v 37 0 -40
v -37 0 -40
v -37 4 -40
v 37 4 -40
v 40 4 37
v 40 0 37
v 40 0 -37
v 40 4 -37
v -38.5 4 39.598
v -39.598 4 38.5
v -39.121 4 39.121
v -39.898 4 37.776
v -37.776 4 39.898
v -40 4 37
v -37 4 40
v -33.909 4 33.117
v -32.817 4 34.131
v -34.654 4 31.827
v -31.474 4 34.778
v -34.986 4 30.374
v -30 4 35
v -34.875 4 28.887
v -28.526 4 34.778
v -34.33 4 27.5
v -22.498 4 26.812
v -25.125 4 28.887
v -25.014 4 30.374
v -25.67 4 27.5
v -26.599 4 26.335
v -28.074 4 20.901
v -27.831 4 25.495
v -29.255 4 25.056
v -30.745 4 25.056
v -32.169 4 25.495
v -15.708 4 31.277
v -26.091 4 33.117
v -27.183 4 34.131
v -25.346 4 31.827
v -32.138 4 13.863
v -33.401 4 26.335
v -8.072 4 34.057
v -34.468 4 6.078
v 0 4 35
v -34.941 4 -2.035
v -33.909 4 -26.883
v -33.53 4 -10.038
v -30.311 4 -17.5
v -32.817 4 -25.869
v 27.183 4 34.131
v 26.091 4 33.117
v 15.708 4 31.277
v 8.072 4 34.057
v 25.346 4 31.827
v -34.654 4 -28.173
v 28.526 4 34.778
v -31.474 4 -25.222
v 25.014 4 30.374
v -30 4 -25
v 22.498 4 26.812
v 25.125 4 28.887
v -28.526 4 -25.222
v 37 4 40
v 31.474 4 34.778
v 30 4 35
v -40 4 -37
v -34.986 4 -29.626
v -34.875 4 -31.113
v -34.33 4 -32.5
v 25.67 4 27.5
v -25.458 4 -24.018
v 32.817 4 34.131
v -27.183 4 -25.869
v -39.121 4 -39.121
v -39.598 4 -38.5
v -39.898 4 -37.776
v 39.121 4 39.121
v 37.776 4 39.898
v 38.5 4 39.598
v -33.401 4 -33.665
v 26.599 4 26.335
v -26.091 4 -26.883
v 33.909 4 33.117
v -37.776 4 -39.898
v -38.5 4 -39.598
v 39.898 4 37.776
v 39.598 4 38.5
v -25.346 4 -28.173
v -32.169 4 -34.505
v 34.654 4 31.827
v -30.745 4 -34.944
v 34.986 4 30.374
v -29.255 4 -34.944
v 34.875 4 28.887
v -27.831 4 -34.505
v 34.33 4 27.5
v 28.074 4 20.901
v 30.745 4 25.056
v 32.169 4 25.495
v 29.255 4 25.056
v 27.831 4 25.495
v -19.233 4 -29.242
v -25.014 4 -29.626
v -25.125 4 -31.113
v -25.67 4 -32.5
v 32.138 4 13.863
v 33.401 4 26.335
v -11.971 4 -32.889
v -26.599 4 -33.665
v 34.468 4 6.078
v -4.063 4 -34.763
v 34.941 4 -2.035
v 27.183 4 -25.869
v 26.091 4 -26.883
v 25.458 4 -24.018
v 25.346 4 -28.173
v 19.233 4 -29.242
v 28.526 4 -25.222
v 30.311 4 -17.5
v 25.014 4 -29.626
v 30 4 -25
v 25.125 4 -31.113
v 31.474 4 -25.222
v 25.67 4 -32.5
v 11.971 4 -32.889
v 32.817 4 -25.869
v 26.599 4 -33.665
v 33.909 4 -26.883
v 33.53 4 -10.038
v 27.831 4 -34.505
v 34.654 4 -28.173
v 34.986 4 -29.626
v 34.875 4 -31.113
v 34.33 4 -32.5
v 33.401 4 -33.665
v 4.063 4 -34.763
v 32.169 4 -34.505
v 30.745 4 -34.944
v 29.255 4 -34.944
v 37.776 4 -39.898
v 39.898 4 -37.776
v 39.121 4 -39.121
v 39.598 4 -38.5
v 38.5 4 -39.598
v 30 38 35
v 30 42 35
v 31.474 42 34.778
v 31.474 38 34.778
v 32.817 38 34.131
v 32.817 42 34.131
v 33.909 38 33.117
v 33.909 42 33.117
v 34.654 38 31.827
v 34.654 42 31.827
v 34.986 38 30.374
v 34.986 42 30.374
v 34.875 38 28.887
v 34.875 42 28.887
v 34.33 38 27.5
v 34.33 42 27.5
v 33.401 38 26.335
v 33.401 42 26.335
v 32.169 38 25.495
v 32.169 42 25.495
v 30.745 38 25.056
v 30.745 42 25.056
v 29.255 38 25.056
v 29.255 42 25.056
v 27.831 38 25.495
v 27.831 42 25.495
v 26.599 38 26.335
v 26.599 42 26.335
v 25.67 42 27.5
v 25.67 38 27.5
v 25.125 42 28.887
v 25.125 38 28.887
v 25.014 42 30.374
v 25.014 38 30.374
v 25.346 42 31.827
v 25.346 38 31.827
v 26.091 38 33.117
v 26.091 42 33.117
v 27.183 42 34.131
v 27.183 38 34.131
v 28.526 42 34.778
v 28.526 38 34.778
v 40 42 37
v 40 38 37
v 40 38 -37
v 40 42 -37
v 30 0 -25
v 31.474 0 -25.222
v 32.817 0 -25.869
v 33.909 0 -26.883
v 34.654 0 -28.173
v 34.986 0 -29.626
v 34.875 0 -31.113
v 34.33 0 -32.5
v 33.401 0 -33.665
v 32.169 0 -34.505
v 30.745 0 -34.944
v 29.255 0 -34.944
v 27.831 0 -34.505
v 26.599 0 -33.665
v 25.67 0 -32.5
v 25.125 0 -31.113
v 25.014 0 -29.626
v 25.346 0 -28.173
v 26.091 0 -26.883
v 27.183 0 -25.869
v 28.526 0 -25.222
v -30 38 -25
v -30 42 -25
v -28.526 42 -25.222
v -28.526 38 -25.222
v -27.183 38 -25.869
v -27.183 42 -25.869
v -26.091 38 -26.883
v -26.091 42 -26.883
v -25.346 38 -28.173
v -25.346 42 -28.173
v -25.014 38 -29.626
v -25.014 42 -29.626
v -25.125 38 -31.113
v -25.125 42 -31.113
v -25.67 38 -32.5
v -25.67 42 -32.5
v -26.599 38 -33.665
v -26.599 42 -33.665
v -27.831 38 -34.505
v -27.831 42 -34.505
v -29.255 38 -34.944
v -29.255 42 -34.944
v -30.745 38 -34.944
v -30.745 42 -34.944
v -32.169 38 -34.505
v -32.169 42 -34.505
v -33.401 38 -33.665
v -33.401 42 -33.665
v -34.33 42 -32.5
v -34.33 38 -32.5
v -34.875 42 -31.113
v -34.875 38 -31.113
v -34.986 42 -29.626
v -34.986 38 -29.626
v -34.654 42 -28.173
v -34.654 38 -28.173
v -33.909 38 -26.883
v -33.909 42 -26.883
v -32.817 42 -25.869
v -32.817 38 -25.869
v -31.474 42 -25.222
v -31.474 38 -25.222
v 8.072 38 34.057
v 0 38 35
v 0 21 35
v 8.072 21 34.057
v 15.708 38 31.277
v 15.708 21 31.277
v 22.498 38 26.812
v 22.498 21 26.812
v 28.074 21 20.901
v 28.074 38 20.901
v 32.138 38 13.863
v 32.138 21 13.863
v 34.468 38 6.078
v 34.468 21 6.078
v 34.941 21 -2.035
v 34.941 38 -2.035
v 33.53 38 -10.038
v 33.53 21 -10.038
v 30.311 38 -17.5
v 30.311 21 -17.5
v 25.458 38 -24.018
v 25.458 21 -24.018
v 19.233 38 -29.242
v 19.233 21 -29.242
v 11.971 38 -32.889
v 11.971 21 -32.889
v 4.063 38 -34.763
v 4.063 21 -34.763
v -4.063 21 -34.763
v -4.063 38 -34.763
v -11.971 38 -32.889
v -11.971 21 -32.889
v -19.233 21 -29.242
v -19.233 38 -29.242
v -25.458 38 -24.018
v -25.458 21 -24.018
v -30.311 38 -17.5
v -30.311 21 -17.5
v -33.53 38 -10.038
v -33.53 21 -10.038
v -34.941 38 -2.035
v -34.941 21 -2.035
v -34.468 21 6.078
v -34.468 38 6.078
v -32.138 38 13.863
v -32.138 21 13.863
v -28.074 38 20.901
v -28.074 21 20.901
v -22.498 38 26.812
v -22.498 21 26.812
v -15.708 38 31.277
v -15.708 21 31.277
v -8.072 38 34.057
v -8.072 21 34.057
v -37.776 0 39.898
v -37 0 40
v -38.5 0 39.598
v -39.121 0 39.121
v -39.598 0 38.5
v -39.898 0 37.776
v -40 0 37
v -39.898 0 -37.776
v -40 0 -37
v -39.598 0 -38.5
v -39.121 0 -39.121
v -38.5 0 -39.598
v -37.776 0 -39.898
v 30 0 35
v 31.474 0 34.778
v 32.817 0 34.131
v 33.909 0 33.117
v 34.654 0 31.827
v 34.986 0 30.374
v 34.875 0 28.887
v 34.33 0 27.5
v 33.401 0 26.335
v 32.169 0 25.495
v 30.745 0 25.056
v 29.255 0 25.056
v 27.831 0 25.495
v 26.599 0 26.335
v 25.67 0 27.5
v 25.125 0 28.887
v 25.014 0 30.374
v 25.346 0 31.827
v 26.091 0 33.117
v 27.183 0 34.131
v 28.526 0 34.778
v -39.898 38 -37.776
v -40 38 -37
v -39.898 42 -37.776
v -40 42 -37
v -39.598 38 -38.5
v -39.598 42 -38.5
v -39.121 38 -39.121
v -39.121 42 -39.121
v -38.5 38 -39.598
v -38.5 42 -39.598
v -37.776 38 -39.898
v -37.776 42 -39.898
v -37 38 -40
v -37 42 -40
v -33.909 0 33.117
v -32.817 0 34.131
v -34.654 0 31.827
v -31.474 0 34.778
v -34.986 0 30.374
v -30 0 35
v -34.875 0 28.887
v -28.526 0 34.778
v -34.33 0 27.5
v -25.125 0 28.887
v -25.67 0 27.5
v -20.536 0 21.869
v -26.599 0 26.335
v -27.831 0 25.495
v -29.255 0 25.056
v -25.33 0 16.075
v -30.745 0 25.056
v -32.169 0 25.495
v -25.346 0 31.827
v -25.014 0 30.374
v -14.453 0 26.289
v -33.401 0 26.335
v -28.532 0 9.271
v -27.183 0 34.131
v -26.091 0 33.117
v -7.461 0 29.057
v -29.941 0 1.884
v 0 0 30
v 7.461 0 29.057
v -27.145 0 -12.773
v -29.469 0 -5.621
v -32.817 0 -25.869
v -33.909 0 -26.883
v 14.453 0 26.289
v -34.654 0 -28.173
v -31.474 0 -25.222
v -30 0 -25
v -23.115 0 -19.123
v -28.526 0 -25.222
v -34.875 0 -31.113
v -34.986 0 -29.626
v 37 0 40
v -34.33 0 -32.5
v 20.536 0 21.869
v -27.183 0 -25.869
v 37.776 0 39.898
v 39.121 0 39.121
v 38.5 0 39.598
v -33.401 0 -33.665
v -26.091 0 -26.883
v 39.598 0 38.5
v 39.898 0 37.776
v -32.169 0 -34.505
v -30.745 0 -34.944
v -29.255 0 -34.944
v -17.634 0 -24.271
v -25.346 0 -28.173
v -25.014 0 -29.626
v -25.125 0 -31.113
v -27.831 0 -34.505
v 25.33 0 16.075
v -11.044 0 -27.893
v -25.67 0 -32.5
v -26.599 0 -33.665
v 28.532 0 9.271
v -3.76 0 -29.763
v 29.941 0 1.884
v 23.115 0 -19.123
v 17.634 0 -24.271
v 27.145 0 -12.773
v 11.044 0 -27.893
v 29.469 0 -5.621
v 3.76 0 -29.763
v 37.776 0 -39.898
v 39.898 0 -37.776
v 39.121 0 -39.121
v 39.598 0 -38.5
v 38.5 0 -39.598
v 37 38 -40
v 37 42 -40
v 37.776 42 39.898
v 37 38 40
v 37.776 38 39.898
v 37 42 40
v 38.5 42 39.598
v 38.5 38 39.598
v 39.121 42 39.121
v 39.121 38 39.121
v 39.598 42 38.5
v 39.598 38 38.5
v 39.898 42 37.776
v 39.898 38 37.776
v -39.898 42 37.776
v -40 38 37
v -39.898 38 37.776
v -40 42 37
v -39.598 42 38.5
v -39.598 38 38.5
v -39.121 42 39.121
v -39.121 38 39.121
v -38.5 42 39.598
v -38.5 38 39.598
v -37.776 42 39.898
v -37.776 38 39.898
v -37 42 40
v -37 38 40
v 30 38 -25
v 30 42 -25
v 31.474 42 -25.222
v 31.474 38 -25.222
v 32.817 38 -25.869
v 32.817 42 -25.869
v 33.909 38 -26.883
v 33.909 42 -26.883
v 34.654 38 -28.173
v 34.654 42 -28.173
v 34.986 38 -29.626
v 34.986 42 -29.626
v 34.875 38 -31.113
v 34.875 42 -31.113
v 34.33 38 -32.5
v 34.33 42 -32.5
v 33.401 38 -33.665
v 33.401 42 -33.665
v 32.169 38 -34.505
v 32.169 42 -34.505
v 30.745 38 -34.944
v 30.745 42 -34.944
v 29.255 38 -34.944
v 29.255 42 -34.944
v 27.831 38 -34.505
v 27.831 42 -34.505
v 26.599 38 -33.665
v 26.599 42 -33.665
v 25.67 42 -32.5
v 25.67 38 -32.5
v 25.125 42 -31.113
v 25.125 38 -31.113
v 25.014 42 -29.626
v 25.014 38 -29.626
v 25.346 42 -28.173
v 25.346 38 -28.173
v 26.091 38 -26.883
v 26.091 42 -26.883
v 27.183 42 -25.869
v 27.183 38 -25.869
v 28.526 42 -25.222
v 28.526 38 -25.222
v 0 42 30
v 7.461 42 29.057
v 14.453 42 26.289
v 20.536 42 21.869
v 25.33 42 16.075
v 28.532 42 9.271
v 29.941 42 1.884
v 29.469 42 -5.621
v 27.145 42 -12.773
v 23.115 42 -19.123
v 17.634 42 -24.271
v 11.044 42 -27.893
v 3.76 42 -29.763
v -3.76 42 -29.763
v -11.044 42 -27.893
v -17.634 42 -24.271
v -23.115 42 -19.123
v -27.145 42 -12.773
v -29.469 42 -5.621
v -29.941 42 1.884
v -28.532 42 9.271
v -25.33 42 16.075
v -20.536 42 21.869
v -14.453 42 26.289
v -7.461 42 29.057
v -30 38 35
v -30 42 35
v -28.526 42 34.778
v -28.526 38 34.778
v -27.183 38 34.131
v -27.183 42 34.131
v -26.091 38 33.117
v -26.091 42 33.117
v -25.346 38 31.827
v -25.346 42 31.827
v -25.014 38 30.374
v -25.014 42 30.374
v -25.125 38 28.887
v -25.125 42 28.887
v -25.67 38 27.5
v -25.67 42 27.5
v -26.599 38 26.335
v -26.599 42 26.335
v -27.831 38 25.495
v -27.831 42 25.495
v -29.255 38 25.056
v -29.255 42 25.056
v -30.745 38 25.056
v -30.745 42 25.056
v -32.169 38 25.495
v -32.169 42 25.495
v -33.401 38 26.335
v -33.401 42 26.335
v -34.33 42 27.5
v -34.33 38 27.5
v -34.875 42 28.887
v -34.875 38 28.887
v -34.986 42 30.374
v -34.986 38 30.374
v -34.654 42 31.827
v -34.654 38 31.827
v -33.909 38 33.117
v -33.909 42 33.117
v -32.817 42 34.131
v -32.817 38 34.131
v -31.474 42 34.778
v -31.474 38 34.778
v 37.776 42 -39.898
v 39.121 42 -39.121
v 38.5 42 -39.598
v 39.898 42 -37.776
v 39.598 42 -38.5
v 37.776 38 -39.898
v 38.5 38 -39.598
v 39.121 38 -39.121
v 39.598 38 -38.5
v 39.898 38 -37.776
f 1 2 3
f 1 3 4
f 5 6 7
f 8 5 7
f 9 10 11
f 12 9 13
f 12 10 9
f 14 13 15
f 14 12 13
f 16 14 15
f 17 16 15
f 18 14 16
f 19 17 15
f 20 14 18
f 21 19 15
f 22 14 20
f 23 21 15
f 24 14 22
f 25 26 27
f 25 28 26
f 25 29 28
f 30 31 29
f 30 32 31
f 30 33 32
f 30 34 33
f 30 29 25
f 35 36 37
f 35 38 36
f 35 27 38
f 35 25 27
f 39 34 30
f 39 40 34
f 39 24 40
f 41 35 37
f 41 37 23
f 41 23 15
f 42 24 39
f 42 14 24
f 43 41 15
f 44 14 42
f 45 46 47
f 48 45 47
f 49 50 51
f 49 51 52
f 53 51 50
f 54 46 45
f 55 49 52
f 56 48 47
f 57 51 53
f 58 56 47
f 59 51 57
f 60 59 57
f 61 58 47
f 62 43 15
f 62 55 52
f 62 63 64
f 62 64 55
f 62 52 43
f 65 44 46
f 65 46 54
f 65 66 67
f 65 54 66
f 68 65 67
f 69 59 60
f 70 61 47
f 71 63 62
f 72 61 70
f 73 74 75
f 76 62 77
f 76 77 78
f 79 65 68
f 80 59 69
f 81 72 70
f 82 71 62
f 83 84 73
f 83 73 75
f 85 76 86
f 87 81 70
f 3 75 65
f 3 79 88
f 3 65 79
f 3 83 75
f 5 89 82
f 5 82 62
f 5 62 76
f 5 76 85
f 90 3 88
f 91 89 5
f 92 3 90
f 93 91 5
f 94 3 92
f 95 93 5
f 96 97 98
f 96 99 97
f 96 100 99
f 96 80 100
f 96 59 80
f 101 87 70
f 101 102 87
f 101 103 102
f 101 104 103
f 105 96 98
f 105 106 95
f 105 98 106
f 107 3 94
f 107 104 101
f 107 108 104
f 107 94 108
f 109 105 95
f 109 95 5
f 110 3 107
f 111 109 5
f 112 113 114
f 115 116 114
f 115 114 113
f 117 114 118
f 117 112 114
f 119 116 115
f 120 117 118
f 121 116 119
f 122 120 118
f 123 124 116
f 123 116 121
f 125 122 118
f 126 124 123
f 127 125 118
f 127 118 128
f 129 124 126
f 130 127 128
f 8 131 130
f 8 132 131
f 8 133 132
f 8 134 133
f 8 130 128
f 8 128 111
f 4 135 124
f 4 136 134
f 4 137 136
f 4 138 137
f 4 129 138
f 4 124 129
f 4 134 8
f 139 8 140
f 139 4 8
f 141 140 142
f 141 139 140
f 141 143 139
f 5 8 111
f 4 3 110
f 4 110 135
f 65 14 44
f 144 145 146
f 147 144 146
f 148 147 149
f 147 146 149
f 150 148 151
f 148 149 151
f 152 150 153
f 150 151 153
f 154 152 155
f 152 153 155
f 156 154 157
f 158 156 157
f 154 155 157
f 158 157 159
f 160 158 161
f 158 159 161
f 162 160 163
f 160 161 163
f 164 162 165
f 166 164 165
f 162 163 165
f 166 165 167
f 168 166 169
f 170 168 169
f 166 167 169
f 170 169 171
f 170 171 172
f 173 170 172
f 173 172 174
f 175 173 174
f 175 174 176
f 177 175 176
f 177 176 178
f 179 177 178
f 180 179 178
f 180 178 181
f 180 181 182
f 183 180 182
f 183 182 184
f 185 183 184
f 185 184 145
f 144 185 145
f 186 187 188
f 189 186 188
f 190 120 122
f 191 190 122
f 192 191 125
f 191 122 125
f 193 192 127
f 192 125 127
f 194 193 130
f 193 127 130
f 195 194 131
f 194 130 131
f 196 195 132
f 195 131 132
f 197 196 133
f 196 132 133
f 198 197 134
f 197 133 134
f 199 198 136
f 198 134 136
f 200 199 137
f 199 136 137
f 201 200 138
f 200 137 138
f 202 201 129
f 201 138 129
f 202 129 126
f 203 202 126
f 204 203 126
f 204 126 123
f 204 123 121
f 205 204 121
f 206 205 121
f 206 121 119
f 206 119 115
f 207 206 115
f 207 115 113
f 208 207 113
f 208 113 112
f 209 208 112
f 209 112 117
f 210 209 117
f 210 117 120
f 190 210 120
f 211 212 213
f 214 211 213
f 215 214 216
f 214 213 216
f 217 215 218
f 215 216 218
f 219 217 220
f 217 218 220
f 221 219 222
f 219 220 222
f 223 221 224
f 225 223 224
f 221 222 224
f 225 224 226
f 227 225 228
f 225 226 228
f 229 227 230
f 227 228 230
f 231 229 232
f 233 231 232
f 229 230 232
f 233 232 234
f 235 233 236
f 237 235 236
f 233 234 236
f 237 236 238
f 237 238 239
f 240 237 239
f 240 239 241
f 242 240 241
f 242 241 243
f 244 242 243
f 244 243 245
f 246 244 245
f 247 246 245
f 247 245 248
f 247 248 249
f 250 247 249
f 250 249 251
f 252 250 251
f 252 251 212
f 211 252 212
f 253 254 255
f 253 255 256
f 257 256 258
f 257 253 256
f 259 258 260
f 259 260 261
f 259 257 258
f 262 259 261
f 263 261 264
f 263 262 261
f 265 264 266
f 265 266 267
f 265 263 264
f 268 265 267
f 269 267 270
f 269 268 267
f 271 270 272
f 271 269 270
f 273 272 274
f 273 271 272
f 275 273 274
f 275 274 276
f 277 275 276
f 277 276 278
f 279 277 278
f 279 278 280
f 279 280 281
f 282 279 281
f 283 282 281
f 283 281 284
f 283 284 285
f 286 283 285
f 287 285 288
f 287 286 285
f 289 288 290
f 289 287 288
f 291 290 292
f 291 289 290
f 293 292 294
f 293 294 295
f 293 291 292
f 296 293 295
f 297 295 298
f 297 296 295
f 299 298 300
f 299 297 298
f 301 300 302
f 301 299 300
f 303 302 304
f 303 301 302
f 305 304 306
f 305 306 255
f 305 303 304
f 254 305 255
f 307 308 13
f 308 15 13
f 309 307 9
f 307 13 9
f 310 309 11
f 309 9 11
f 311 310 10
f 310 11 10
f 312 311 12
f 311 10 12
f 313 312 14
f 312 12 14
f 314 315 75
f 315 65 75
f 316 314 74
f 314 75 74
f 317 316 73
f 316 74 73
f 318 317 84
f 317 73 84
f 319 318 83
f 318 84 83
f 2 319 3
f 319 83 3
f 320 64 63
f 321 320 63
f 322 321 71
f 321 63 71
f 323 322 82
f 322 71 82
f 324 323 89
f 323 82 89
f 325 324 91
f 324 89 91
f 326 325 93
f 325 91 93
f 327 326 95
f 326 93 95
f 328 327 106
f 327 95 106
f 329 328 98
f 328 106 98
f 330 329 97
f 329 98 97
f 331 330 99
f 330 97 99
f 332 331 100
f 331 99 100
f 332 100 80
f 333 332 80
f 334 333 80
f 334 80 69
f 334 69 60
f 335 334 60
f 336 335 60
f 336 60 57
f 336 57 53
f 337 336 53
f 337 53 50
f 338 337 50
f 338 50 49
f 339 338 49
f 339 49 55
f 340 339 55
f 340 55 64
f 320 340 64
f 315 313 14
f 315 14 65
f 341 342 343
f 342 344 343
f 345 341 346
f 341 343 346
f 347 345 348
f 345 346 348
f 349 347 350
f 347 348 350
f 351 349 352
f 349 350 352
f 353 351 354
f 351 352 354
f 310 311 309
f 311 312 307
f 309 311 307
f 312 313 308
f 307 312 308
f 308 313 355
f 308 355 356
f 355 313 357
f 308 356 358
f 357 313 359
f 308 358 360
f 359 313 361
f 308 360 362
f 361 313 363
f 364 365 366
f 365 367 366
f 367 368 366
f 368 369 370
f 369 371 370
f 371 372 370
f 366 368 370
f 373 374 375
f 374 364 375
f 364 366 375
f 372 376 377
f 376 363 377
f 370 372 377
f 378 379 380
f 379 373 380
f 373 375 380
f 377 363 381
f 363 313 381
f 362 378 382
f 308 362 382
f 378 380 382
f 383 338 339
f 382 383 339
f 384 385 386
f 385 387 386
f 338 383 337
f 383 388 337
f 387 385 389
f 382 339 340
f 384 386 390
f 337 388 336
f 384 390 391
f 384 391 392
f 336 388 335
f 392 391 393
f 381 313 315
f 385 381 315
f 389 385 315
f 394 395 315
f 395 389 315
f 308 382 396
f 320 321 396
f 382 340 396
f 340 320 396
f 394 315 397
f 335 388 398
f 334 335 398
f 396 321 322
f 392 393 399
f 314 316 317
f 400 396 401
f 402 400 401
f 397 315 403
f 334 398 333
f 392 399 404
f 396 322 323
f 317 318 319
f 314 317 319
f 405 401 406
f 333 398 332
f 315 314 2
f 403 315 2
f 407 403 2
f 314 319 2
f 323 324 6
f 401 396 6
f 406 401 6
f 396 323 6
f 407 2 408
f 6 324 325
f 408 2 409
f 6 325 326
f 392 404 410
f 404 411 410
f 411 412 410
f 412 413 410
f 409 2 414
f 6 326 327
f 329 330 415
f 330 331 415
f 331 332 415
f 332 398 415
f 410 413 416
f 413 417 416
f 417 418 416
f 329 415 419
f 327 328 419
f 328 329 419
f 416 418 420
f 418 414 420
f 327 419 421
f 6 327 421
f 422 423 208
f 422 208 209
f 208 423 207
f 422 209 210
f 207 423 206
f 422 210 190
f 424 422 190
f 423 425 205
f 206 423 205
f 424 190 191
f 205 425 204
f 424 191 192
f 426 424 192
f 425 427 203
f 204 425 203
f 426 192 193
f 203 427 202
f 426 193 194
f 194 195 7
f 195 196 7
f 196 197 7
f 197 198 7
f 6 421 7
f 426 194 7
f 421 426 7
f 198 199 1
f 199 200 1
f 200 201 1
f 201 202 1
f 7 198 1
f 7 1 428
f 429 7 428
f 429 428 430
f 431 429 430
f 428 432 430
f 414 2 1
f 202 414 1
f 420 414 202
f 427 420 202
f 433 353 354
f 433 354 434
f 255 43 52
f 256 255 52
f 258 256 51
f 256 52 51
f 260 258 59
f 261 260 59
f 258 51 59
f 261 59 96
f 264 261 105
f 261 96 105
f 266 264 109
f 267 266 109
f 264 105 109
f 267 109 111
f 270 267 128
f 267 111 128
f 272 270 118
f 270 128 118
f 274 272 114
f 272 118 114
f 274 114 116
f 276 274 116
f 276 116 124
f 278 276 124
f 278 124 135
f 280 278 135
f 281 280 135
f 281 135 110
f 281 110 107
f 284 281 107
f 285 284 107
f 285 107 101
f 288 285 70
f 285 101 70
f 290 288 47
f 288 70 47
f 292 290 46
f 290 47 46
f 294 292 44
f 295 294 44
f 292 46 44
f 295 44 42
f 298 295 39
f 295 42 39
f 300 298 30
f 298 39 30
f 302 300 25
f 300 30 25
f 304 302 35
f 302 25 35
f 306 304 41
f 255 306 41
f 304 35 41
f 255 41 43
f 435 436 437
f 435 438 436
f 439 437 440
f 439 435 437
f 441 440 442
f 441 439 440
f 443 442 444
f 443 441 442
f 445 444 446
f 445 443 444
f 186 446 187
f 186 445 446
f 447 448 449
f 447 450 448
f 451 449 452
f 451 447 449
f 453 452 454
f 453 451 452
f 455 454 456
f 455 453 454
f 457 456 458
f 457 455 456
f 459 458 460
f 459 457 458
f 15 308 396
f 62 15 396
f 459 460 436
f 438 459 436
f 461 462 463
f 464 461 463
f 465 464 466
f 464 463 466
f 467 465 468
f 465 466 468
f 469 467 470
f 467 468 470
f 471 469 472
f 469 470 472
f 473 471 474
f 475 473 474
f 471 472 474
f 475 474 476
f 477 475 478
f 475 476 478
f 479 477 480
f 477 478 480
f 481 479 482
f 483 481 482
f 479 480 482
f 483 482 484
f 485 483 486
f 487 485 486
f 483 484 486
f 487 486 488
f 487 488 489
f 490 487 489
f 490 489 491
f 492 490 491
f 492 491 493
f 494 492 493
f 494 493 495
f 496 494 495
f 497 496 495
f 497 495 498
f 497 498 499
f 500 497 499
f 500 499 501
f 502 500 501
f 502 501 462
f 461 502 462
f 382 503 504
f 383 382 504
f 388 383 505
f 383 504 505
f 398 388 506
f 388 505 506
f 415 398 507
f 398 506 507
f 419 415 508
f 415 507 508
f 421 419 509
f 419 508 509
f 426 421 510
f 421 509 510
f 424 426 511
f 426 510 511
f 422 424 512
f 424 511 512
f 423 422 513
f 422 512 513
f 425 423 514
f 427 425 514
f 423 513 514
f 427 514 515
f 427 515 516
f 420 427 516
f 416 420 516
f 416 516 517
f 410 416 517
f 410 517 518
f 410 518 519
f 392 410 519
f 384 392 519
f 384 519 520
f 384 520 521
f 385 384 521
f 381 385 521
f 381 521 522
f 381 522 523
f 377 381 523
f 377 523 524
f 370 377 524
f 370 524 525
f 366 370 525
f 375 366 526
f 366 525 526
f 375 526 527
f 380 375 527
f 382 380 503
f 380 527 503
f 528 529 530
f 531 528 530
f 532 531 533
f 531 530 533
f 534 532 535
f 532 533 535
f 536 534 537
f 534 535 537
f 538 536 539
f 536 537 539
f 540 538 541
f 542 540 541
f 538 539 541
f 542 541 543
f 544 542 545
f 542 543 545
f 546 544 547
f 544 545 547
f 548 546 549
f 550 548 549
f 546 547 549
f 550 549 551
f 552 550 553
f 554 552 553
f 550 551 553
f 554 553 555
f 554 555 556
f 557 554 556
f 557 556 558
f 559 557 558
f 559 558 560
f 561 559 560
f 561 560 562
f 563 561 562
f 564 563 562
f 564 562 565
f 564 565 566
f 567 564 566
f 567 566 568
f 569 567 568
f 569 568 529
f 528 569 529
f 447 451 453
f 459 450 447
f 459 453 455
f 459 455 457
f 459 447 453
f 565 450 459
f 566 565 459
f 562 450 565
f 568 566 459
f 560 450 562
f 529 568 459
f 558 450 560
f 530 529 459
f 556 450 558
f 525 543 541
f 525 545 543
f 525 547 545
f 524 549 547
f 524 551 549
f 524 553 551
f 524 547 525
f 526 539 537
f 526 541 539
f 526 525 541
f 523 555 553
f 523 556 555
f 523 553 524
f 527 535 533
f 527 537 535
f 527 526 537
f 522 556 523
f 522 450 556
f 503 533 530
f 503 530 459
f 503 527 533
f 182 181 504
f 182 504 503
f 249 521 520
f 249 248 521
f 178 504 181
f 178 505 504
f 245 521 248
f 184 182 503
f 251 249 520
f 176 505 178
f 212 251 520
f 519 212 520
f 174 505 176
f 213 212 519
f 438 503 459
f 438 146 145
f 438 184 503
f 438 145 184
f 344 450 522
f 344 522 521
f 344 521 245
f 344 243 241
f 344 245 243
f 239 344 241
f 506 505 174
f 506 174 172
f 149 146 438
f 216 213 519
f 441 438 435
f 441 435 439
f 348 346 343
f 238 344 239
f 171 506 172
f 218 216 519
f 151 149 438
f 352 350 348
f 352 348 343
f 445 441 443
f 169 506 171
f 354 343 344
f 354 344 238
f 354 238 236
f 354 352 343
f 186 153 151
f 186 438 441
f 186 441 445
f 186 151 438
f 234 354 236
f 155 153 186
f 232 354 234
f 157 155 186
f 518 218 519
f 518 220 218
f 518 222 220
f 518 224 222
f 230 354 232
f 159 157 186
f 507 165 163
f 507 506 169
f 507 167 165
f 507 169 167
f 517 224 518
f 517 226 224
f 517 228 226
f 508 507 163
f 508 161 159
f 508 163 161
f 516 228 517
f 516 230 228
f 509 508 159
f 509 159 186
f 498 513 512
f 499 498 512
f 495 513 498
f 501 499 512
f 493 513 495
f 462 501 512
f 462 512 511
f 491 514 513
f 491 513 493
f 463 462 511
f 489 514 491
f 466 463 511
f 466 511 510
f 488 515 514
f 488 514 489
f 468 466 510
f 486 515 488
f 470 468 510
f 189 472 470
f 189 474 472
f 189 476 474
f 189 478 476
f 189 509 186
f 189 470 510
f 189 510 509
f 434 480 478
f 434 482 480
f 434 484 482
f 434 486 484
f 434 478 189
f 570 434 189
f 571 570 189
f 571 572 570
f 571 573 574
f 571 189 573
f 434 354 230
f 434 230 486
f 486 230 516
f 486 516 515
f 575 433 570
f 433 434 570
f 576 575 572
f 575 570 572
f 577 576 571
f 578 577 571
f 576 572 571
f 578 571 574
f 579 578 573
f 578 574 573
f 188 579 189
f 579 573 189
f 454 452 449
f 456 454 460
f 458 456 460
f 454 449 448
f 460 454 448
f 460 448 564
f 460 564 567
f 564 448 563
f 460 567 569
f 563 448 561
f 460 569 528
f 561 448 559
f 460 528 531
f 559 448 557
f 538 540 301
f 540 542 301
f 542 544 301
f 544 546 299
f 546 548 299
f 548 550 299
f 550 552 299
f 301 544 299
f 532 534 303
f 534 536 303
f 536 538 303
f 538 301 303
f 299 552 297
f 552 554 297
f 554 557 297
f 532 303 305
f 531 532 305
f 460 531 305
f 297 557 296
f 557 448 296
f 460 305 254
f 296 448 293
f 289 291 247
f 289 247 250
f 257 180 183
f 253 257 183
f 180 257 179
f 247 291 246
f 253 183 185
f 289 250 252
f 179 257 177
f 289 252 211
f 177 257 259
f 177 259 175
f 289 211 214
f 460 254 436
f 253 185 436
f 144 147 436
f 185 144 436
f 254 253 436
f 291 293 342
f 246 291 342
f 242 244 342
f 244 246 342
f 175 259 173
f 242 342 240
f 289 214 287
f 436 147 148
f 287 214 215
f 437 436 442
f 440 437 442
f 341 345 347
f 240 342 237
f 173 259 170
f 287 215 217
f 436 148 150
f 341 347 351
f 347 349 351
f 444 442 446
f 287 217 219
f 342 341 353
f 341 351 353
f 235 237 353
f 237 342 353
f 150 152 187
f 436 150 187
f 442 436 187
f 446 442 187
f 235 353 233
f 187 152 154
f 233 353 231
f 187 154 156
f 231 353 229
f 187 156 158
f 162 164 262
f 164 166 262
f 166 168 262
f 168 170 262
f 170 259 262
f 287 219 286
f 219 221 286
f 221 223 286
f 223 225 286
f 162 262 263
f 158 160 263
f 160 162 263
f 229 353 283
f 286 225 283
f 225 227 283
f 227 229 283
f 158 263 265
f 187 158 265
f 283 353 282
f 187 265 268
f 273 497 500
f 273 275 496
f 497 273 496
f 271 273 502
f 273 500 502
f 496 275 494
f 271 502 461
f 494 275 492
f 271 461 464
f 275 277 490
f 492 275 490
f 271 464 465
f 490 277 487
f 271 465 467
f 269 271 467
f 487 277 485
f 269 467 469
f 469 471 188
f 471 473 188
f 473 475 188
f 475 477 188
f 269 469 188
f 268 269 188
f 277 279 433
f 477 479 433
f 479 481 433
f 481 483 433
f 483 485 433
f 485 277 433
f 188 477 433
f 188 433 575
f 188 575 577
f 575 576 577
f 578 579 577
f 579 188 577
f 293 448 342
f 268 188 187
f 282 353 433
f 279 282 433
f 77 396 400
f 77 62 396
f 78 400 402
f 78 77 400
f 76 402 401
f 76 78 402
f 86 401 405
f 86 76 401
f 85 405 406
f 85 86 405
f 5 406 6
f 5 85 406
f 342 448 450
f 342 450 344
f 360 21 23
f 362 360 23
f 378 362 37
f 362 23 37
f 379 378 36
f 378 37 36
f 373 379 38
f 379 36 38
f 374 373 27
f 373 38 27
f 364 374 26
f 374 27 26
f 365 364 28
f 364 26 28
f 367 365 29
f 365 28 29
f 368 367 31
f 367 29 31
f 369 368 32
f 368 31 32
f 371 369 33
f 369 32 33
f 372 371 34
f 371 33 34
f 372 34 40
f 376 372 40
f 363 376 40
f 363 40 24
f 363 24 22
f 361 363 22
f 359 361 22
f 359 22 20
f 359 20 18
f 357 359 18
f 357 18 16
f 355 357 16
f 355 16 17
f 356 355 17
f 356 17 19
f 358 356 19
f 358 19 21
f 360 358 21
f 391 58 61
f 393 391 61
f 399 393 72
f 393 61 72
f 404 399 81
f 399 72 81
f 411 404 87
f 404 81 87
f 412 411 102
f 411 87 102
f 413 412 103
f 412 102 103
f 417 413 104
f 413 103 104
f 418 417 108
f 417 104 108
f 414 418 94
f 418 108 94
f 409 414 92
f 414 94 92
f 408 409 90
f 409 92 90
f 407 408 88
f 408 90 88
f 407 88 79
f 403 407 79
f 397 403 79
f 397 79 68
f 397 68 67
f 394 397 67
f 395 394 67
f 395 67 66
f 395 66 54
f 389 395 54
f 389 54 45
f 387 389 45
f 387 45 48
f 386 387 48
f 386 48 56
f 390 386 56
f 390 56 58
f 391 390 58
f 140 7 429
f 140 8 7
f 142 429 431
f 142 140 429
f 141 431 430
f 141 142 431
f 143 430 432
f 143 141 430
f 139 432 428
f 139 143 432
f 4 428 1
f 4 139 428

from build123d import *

# Parameters (mm, degrees)
SKETCH1_W           = 80
SKETCH1_H           = 80
BOSS_EXTRUDE1_DEPTH = 4
FILLET3_R           = 3
FILLET2_R           = 3
SKETCH3_R           = 35
BOSS_EXTRUDE3_DEPTH = 17
SKETCH4_W           = 80
SKETCH4_H           = 80
BOSS_EXTRUDE4_DEPTH = 4
FILLET4_R           = 3
SKETCH5_R           = 30
CUT_EXTRUDE1_DEPTH  = 71.455659815
SKETCH6_R           = 5
CUT_EXTRUDE2_DEPTH  = 71.455659815


with BuildPart() as part:
    # Sketch1 → Boss-Extrude1 (new body)
    with BuildSketch(Plane(origin=(0, 0, 0), x_dir=(1, 0, 0), z_dir=(0, 1, 0))):
        Rectangle(SKETCH1_W, SKETCH1_H)
    extrude(amount=BOSS_EXTRUDE1_DEPTH)

    # Fillet3
    fillet3_edges = [part.edges().sort_by_distance(p)[0] for p in [
        (40, 2, 40),
    ]]
    fillet(fillet3_edges, radius=FILLET3_R)

    # Fillet2
    fillet2_edges = [part.edges().sort_by_distance(p)[0] for p in [
        (-40, 2, -40),
        (40, 2, -40),
        (-40, 2, 40),
    ]]
    fillet(fillet2_edges, radius=FILLET2_R)

    # Sketch3 → Boss-Extrude3 (add)
    with BuildSketch(Plane(origin=(0, 4, 0), x_dir=(1, 0, 0), z_dir=(0, 1, 0))):
        with Locations(Location((0, 0, 0), (0, 0, 270))):
            Circle(SKETCH3_R)
    boss_extrude3 = extrude(amount=BOSS_EXTRUDE3_DEPTH)

    # Mirror1: Boss-Extrude3 across plane
    add(boss_extrude3.mirror(Plane.ZX.offset(21)))

    # Sketch4 → Boss-Extrude4 (add)
    with BuildSketch(Plane(origin=(0, 38, 0), x_dir=(1, 0, 0), z_dir=(0, 1, 0))):
        Rectangle(SKETCH4_W, SKETCH4_H)
    extrude(amount=BOSS_EXTRUDE4_DEPTH)

    # Fillet4
    fillet4_edges = [part.edges().sort_by_distance(p)[0] for p in [
        (-40, 40, -40),
        (-40, 40, 40),
        (40, 40, 40),
        (40, 40, -40),
    ]]
    fillet(fillet4_edges, radius=FILLET4_R)

    # Sketch5 → Cut-Extrude1 (cut, through all)
    with BuildSketch(Plane(origin=(0, 42, 0), x_dir=(1, 0, 0), z_dir=(0, 1, 0))):
        with Locations(Location((0, 0, 0), (0, 0, 270))):
            Circle(SKETCH5_R)
    extrude(amount=-CUT_EXTRUDE1_DEPTH, mode=Mode.SUBTRACT)

    # Sketch6 → Cut-Extrude2 (cut, through all)
    with BuildSketch(Plane(origin=(0, 42, 0), x_dir=(1, 0, 0), z_dir=(0, 1, 0))):
        with Locations(Location((30, 30, 0), (0, 0, 270))):
            Circle(SKETCH6_R)
        with Locations(Location((30, -30, 0), (0, 0, 270))):
            Circle(SKETCH6_R)
        with Locations(Location((-30, -30, 0), (0, 0, 270))):
            Circle(SKETCH6_R)
        with Locations(Location((-30, 30, 0), (0, 0, 270))):
            Circle(SKETCH6_R)
    extrude(amount=-CUT_EXTRUDE2_DEPTH, mode=Mode.SUBTRACT)


solid = part.part
